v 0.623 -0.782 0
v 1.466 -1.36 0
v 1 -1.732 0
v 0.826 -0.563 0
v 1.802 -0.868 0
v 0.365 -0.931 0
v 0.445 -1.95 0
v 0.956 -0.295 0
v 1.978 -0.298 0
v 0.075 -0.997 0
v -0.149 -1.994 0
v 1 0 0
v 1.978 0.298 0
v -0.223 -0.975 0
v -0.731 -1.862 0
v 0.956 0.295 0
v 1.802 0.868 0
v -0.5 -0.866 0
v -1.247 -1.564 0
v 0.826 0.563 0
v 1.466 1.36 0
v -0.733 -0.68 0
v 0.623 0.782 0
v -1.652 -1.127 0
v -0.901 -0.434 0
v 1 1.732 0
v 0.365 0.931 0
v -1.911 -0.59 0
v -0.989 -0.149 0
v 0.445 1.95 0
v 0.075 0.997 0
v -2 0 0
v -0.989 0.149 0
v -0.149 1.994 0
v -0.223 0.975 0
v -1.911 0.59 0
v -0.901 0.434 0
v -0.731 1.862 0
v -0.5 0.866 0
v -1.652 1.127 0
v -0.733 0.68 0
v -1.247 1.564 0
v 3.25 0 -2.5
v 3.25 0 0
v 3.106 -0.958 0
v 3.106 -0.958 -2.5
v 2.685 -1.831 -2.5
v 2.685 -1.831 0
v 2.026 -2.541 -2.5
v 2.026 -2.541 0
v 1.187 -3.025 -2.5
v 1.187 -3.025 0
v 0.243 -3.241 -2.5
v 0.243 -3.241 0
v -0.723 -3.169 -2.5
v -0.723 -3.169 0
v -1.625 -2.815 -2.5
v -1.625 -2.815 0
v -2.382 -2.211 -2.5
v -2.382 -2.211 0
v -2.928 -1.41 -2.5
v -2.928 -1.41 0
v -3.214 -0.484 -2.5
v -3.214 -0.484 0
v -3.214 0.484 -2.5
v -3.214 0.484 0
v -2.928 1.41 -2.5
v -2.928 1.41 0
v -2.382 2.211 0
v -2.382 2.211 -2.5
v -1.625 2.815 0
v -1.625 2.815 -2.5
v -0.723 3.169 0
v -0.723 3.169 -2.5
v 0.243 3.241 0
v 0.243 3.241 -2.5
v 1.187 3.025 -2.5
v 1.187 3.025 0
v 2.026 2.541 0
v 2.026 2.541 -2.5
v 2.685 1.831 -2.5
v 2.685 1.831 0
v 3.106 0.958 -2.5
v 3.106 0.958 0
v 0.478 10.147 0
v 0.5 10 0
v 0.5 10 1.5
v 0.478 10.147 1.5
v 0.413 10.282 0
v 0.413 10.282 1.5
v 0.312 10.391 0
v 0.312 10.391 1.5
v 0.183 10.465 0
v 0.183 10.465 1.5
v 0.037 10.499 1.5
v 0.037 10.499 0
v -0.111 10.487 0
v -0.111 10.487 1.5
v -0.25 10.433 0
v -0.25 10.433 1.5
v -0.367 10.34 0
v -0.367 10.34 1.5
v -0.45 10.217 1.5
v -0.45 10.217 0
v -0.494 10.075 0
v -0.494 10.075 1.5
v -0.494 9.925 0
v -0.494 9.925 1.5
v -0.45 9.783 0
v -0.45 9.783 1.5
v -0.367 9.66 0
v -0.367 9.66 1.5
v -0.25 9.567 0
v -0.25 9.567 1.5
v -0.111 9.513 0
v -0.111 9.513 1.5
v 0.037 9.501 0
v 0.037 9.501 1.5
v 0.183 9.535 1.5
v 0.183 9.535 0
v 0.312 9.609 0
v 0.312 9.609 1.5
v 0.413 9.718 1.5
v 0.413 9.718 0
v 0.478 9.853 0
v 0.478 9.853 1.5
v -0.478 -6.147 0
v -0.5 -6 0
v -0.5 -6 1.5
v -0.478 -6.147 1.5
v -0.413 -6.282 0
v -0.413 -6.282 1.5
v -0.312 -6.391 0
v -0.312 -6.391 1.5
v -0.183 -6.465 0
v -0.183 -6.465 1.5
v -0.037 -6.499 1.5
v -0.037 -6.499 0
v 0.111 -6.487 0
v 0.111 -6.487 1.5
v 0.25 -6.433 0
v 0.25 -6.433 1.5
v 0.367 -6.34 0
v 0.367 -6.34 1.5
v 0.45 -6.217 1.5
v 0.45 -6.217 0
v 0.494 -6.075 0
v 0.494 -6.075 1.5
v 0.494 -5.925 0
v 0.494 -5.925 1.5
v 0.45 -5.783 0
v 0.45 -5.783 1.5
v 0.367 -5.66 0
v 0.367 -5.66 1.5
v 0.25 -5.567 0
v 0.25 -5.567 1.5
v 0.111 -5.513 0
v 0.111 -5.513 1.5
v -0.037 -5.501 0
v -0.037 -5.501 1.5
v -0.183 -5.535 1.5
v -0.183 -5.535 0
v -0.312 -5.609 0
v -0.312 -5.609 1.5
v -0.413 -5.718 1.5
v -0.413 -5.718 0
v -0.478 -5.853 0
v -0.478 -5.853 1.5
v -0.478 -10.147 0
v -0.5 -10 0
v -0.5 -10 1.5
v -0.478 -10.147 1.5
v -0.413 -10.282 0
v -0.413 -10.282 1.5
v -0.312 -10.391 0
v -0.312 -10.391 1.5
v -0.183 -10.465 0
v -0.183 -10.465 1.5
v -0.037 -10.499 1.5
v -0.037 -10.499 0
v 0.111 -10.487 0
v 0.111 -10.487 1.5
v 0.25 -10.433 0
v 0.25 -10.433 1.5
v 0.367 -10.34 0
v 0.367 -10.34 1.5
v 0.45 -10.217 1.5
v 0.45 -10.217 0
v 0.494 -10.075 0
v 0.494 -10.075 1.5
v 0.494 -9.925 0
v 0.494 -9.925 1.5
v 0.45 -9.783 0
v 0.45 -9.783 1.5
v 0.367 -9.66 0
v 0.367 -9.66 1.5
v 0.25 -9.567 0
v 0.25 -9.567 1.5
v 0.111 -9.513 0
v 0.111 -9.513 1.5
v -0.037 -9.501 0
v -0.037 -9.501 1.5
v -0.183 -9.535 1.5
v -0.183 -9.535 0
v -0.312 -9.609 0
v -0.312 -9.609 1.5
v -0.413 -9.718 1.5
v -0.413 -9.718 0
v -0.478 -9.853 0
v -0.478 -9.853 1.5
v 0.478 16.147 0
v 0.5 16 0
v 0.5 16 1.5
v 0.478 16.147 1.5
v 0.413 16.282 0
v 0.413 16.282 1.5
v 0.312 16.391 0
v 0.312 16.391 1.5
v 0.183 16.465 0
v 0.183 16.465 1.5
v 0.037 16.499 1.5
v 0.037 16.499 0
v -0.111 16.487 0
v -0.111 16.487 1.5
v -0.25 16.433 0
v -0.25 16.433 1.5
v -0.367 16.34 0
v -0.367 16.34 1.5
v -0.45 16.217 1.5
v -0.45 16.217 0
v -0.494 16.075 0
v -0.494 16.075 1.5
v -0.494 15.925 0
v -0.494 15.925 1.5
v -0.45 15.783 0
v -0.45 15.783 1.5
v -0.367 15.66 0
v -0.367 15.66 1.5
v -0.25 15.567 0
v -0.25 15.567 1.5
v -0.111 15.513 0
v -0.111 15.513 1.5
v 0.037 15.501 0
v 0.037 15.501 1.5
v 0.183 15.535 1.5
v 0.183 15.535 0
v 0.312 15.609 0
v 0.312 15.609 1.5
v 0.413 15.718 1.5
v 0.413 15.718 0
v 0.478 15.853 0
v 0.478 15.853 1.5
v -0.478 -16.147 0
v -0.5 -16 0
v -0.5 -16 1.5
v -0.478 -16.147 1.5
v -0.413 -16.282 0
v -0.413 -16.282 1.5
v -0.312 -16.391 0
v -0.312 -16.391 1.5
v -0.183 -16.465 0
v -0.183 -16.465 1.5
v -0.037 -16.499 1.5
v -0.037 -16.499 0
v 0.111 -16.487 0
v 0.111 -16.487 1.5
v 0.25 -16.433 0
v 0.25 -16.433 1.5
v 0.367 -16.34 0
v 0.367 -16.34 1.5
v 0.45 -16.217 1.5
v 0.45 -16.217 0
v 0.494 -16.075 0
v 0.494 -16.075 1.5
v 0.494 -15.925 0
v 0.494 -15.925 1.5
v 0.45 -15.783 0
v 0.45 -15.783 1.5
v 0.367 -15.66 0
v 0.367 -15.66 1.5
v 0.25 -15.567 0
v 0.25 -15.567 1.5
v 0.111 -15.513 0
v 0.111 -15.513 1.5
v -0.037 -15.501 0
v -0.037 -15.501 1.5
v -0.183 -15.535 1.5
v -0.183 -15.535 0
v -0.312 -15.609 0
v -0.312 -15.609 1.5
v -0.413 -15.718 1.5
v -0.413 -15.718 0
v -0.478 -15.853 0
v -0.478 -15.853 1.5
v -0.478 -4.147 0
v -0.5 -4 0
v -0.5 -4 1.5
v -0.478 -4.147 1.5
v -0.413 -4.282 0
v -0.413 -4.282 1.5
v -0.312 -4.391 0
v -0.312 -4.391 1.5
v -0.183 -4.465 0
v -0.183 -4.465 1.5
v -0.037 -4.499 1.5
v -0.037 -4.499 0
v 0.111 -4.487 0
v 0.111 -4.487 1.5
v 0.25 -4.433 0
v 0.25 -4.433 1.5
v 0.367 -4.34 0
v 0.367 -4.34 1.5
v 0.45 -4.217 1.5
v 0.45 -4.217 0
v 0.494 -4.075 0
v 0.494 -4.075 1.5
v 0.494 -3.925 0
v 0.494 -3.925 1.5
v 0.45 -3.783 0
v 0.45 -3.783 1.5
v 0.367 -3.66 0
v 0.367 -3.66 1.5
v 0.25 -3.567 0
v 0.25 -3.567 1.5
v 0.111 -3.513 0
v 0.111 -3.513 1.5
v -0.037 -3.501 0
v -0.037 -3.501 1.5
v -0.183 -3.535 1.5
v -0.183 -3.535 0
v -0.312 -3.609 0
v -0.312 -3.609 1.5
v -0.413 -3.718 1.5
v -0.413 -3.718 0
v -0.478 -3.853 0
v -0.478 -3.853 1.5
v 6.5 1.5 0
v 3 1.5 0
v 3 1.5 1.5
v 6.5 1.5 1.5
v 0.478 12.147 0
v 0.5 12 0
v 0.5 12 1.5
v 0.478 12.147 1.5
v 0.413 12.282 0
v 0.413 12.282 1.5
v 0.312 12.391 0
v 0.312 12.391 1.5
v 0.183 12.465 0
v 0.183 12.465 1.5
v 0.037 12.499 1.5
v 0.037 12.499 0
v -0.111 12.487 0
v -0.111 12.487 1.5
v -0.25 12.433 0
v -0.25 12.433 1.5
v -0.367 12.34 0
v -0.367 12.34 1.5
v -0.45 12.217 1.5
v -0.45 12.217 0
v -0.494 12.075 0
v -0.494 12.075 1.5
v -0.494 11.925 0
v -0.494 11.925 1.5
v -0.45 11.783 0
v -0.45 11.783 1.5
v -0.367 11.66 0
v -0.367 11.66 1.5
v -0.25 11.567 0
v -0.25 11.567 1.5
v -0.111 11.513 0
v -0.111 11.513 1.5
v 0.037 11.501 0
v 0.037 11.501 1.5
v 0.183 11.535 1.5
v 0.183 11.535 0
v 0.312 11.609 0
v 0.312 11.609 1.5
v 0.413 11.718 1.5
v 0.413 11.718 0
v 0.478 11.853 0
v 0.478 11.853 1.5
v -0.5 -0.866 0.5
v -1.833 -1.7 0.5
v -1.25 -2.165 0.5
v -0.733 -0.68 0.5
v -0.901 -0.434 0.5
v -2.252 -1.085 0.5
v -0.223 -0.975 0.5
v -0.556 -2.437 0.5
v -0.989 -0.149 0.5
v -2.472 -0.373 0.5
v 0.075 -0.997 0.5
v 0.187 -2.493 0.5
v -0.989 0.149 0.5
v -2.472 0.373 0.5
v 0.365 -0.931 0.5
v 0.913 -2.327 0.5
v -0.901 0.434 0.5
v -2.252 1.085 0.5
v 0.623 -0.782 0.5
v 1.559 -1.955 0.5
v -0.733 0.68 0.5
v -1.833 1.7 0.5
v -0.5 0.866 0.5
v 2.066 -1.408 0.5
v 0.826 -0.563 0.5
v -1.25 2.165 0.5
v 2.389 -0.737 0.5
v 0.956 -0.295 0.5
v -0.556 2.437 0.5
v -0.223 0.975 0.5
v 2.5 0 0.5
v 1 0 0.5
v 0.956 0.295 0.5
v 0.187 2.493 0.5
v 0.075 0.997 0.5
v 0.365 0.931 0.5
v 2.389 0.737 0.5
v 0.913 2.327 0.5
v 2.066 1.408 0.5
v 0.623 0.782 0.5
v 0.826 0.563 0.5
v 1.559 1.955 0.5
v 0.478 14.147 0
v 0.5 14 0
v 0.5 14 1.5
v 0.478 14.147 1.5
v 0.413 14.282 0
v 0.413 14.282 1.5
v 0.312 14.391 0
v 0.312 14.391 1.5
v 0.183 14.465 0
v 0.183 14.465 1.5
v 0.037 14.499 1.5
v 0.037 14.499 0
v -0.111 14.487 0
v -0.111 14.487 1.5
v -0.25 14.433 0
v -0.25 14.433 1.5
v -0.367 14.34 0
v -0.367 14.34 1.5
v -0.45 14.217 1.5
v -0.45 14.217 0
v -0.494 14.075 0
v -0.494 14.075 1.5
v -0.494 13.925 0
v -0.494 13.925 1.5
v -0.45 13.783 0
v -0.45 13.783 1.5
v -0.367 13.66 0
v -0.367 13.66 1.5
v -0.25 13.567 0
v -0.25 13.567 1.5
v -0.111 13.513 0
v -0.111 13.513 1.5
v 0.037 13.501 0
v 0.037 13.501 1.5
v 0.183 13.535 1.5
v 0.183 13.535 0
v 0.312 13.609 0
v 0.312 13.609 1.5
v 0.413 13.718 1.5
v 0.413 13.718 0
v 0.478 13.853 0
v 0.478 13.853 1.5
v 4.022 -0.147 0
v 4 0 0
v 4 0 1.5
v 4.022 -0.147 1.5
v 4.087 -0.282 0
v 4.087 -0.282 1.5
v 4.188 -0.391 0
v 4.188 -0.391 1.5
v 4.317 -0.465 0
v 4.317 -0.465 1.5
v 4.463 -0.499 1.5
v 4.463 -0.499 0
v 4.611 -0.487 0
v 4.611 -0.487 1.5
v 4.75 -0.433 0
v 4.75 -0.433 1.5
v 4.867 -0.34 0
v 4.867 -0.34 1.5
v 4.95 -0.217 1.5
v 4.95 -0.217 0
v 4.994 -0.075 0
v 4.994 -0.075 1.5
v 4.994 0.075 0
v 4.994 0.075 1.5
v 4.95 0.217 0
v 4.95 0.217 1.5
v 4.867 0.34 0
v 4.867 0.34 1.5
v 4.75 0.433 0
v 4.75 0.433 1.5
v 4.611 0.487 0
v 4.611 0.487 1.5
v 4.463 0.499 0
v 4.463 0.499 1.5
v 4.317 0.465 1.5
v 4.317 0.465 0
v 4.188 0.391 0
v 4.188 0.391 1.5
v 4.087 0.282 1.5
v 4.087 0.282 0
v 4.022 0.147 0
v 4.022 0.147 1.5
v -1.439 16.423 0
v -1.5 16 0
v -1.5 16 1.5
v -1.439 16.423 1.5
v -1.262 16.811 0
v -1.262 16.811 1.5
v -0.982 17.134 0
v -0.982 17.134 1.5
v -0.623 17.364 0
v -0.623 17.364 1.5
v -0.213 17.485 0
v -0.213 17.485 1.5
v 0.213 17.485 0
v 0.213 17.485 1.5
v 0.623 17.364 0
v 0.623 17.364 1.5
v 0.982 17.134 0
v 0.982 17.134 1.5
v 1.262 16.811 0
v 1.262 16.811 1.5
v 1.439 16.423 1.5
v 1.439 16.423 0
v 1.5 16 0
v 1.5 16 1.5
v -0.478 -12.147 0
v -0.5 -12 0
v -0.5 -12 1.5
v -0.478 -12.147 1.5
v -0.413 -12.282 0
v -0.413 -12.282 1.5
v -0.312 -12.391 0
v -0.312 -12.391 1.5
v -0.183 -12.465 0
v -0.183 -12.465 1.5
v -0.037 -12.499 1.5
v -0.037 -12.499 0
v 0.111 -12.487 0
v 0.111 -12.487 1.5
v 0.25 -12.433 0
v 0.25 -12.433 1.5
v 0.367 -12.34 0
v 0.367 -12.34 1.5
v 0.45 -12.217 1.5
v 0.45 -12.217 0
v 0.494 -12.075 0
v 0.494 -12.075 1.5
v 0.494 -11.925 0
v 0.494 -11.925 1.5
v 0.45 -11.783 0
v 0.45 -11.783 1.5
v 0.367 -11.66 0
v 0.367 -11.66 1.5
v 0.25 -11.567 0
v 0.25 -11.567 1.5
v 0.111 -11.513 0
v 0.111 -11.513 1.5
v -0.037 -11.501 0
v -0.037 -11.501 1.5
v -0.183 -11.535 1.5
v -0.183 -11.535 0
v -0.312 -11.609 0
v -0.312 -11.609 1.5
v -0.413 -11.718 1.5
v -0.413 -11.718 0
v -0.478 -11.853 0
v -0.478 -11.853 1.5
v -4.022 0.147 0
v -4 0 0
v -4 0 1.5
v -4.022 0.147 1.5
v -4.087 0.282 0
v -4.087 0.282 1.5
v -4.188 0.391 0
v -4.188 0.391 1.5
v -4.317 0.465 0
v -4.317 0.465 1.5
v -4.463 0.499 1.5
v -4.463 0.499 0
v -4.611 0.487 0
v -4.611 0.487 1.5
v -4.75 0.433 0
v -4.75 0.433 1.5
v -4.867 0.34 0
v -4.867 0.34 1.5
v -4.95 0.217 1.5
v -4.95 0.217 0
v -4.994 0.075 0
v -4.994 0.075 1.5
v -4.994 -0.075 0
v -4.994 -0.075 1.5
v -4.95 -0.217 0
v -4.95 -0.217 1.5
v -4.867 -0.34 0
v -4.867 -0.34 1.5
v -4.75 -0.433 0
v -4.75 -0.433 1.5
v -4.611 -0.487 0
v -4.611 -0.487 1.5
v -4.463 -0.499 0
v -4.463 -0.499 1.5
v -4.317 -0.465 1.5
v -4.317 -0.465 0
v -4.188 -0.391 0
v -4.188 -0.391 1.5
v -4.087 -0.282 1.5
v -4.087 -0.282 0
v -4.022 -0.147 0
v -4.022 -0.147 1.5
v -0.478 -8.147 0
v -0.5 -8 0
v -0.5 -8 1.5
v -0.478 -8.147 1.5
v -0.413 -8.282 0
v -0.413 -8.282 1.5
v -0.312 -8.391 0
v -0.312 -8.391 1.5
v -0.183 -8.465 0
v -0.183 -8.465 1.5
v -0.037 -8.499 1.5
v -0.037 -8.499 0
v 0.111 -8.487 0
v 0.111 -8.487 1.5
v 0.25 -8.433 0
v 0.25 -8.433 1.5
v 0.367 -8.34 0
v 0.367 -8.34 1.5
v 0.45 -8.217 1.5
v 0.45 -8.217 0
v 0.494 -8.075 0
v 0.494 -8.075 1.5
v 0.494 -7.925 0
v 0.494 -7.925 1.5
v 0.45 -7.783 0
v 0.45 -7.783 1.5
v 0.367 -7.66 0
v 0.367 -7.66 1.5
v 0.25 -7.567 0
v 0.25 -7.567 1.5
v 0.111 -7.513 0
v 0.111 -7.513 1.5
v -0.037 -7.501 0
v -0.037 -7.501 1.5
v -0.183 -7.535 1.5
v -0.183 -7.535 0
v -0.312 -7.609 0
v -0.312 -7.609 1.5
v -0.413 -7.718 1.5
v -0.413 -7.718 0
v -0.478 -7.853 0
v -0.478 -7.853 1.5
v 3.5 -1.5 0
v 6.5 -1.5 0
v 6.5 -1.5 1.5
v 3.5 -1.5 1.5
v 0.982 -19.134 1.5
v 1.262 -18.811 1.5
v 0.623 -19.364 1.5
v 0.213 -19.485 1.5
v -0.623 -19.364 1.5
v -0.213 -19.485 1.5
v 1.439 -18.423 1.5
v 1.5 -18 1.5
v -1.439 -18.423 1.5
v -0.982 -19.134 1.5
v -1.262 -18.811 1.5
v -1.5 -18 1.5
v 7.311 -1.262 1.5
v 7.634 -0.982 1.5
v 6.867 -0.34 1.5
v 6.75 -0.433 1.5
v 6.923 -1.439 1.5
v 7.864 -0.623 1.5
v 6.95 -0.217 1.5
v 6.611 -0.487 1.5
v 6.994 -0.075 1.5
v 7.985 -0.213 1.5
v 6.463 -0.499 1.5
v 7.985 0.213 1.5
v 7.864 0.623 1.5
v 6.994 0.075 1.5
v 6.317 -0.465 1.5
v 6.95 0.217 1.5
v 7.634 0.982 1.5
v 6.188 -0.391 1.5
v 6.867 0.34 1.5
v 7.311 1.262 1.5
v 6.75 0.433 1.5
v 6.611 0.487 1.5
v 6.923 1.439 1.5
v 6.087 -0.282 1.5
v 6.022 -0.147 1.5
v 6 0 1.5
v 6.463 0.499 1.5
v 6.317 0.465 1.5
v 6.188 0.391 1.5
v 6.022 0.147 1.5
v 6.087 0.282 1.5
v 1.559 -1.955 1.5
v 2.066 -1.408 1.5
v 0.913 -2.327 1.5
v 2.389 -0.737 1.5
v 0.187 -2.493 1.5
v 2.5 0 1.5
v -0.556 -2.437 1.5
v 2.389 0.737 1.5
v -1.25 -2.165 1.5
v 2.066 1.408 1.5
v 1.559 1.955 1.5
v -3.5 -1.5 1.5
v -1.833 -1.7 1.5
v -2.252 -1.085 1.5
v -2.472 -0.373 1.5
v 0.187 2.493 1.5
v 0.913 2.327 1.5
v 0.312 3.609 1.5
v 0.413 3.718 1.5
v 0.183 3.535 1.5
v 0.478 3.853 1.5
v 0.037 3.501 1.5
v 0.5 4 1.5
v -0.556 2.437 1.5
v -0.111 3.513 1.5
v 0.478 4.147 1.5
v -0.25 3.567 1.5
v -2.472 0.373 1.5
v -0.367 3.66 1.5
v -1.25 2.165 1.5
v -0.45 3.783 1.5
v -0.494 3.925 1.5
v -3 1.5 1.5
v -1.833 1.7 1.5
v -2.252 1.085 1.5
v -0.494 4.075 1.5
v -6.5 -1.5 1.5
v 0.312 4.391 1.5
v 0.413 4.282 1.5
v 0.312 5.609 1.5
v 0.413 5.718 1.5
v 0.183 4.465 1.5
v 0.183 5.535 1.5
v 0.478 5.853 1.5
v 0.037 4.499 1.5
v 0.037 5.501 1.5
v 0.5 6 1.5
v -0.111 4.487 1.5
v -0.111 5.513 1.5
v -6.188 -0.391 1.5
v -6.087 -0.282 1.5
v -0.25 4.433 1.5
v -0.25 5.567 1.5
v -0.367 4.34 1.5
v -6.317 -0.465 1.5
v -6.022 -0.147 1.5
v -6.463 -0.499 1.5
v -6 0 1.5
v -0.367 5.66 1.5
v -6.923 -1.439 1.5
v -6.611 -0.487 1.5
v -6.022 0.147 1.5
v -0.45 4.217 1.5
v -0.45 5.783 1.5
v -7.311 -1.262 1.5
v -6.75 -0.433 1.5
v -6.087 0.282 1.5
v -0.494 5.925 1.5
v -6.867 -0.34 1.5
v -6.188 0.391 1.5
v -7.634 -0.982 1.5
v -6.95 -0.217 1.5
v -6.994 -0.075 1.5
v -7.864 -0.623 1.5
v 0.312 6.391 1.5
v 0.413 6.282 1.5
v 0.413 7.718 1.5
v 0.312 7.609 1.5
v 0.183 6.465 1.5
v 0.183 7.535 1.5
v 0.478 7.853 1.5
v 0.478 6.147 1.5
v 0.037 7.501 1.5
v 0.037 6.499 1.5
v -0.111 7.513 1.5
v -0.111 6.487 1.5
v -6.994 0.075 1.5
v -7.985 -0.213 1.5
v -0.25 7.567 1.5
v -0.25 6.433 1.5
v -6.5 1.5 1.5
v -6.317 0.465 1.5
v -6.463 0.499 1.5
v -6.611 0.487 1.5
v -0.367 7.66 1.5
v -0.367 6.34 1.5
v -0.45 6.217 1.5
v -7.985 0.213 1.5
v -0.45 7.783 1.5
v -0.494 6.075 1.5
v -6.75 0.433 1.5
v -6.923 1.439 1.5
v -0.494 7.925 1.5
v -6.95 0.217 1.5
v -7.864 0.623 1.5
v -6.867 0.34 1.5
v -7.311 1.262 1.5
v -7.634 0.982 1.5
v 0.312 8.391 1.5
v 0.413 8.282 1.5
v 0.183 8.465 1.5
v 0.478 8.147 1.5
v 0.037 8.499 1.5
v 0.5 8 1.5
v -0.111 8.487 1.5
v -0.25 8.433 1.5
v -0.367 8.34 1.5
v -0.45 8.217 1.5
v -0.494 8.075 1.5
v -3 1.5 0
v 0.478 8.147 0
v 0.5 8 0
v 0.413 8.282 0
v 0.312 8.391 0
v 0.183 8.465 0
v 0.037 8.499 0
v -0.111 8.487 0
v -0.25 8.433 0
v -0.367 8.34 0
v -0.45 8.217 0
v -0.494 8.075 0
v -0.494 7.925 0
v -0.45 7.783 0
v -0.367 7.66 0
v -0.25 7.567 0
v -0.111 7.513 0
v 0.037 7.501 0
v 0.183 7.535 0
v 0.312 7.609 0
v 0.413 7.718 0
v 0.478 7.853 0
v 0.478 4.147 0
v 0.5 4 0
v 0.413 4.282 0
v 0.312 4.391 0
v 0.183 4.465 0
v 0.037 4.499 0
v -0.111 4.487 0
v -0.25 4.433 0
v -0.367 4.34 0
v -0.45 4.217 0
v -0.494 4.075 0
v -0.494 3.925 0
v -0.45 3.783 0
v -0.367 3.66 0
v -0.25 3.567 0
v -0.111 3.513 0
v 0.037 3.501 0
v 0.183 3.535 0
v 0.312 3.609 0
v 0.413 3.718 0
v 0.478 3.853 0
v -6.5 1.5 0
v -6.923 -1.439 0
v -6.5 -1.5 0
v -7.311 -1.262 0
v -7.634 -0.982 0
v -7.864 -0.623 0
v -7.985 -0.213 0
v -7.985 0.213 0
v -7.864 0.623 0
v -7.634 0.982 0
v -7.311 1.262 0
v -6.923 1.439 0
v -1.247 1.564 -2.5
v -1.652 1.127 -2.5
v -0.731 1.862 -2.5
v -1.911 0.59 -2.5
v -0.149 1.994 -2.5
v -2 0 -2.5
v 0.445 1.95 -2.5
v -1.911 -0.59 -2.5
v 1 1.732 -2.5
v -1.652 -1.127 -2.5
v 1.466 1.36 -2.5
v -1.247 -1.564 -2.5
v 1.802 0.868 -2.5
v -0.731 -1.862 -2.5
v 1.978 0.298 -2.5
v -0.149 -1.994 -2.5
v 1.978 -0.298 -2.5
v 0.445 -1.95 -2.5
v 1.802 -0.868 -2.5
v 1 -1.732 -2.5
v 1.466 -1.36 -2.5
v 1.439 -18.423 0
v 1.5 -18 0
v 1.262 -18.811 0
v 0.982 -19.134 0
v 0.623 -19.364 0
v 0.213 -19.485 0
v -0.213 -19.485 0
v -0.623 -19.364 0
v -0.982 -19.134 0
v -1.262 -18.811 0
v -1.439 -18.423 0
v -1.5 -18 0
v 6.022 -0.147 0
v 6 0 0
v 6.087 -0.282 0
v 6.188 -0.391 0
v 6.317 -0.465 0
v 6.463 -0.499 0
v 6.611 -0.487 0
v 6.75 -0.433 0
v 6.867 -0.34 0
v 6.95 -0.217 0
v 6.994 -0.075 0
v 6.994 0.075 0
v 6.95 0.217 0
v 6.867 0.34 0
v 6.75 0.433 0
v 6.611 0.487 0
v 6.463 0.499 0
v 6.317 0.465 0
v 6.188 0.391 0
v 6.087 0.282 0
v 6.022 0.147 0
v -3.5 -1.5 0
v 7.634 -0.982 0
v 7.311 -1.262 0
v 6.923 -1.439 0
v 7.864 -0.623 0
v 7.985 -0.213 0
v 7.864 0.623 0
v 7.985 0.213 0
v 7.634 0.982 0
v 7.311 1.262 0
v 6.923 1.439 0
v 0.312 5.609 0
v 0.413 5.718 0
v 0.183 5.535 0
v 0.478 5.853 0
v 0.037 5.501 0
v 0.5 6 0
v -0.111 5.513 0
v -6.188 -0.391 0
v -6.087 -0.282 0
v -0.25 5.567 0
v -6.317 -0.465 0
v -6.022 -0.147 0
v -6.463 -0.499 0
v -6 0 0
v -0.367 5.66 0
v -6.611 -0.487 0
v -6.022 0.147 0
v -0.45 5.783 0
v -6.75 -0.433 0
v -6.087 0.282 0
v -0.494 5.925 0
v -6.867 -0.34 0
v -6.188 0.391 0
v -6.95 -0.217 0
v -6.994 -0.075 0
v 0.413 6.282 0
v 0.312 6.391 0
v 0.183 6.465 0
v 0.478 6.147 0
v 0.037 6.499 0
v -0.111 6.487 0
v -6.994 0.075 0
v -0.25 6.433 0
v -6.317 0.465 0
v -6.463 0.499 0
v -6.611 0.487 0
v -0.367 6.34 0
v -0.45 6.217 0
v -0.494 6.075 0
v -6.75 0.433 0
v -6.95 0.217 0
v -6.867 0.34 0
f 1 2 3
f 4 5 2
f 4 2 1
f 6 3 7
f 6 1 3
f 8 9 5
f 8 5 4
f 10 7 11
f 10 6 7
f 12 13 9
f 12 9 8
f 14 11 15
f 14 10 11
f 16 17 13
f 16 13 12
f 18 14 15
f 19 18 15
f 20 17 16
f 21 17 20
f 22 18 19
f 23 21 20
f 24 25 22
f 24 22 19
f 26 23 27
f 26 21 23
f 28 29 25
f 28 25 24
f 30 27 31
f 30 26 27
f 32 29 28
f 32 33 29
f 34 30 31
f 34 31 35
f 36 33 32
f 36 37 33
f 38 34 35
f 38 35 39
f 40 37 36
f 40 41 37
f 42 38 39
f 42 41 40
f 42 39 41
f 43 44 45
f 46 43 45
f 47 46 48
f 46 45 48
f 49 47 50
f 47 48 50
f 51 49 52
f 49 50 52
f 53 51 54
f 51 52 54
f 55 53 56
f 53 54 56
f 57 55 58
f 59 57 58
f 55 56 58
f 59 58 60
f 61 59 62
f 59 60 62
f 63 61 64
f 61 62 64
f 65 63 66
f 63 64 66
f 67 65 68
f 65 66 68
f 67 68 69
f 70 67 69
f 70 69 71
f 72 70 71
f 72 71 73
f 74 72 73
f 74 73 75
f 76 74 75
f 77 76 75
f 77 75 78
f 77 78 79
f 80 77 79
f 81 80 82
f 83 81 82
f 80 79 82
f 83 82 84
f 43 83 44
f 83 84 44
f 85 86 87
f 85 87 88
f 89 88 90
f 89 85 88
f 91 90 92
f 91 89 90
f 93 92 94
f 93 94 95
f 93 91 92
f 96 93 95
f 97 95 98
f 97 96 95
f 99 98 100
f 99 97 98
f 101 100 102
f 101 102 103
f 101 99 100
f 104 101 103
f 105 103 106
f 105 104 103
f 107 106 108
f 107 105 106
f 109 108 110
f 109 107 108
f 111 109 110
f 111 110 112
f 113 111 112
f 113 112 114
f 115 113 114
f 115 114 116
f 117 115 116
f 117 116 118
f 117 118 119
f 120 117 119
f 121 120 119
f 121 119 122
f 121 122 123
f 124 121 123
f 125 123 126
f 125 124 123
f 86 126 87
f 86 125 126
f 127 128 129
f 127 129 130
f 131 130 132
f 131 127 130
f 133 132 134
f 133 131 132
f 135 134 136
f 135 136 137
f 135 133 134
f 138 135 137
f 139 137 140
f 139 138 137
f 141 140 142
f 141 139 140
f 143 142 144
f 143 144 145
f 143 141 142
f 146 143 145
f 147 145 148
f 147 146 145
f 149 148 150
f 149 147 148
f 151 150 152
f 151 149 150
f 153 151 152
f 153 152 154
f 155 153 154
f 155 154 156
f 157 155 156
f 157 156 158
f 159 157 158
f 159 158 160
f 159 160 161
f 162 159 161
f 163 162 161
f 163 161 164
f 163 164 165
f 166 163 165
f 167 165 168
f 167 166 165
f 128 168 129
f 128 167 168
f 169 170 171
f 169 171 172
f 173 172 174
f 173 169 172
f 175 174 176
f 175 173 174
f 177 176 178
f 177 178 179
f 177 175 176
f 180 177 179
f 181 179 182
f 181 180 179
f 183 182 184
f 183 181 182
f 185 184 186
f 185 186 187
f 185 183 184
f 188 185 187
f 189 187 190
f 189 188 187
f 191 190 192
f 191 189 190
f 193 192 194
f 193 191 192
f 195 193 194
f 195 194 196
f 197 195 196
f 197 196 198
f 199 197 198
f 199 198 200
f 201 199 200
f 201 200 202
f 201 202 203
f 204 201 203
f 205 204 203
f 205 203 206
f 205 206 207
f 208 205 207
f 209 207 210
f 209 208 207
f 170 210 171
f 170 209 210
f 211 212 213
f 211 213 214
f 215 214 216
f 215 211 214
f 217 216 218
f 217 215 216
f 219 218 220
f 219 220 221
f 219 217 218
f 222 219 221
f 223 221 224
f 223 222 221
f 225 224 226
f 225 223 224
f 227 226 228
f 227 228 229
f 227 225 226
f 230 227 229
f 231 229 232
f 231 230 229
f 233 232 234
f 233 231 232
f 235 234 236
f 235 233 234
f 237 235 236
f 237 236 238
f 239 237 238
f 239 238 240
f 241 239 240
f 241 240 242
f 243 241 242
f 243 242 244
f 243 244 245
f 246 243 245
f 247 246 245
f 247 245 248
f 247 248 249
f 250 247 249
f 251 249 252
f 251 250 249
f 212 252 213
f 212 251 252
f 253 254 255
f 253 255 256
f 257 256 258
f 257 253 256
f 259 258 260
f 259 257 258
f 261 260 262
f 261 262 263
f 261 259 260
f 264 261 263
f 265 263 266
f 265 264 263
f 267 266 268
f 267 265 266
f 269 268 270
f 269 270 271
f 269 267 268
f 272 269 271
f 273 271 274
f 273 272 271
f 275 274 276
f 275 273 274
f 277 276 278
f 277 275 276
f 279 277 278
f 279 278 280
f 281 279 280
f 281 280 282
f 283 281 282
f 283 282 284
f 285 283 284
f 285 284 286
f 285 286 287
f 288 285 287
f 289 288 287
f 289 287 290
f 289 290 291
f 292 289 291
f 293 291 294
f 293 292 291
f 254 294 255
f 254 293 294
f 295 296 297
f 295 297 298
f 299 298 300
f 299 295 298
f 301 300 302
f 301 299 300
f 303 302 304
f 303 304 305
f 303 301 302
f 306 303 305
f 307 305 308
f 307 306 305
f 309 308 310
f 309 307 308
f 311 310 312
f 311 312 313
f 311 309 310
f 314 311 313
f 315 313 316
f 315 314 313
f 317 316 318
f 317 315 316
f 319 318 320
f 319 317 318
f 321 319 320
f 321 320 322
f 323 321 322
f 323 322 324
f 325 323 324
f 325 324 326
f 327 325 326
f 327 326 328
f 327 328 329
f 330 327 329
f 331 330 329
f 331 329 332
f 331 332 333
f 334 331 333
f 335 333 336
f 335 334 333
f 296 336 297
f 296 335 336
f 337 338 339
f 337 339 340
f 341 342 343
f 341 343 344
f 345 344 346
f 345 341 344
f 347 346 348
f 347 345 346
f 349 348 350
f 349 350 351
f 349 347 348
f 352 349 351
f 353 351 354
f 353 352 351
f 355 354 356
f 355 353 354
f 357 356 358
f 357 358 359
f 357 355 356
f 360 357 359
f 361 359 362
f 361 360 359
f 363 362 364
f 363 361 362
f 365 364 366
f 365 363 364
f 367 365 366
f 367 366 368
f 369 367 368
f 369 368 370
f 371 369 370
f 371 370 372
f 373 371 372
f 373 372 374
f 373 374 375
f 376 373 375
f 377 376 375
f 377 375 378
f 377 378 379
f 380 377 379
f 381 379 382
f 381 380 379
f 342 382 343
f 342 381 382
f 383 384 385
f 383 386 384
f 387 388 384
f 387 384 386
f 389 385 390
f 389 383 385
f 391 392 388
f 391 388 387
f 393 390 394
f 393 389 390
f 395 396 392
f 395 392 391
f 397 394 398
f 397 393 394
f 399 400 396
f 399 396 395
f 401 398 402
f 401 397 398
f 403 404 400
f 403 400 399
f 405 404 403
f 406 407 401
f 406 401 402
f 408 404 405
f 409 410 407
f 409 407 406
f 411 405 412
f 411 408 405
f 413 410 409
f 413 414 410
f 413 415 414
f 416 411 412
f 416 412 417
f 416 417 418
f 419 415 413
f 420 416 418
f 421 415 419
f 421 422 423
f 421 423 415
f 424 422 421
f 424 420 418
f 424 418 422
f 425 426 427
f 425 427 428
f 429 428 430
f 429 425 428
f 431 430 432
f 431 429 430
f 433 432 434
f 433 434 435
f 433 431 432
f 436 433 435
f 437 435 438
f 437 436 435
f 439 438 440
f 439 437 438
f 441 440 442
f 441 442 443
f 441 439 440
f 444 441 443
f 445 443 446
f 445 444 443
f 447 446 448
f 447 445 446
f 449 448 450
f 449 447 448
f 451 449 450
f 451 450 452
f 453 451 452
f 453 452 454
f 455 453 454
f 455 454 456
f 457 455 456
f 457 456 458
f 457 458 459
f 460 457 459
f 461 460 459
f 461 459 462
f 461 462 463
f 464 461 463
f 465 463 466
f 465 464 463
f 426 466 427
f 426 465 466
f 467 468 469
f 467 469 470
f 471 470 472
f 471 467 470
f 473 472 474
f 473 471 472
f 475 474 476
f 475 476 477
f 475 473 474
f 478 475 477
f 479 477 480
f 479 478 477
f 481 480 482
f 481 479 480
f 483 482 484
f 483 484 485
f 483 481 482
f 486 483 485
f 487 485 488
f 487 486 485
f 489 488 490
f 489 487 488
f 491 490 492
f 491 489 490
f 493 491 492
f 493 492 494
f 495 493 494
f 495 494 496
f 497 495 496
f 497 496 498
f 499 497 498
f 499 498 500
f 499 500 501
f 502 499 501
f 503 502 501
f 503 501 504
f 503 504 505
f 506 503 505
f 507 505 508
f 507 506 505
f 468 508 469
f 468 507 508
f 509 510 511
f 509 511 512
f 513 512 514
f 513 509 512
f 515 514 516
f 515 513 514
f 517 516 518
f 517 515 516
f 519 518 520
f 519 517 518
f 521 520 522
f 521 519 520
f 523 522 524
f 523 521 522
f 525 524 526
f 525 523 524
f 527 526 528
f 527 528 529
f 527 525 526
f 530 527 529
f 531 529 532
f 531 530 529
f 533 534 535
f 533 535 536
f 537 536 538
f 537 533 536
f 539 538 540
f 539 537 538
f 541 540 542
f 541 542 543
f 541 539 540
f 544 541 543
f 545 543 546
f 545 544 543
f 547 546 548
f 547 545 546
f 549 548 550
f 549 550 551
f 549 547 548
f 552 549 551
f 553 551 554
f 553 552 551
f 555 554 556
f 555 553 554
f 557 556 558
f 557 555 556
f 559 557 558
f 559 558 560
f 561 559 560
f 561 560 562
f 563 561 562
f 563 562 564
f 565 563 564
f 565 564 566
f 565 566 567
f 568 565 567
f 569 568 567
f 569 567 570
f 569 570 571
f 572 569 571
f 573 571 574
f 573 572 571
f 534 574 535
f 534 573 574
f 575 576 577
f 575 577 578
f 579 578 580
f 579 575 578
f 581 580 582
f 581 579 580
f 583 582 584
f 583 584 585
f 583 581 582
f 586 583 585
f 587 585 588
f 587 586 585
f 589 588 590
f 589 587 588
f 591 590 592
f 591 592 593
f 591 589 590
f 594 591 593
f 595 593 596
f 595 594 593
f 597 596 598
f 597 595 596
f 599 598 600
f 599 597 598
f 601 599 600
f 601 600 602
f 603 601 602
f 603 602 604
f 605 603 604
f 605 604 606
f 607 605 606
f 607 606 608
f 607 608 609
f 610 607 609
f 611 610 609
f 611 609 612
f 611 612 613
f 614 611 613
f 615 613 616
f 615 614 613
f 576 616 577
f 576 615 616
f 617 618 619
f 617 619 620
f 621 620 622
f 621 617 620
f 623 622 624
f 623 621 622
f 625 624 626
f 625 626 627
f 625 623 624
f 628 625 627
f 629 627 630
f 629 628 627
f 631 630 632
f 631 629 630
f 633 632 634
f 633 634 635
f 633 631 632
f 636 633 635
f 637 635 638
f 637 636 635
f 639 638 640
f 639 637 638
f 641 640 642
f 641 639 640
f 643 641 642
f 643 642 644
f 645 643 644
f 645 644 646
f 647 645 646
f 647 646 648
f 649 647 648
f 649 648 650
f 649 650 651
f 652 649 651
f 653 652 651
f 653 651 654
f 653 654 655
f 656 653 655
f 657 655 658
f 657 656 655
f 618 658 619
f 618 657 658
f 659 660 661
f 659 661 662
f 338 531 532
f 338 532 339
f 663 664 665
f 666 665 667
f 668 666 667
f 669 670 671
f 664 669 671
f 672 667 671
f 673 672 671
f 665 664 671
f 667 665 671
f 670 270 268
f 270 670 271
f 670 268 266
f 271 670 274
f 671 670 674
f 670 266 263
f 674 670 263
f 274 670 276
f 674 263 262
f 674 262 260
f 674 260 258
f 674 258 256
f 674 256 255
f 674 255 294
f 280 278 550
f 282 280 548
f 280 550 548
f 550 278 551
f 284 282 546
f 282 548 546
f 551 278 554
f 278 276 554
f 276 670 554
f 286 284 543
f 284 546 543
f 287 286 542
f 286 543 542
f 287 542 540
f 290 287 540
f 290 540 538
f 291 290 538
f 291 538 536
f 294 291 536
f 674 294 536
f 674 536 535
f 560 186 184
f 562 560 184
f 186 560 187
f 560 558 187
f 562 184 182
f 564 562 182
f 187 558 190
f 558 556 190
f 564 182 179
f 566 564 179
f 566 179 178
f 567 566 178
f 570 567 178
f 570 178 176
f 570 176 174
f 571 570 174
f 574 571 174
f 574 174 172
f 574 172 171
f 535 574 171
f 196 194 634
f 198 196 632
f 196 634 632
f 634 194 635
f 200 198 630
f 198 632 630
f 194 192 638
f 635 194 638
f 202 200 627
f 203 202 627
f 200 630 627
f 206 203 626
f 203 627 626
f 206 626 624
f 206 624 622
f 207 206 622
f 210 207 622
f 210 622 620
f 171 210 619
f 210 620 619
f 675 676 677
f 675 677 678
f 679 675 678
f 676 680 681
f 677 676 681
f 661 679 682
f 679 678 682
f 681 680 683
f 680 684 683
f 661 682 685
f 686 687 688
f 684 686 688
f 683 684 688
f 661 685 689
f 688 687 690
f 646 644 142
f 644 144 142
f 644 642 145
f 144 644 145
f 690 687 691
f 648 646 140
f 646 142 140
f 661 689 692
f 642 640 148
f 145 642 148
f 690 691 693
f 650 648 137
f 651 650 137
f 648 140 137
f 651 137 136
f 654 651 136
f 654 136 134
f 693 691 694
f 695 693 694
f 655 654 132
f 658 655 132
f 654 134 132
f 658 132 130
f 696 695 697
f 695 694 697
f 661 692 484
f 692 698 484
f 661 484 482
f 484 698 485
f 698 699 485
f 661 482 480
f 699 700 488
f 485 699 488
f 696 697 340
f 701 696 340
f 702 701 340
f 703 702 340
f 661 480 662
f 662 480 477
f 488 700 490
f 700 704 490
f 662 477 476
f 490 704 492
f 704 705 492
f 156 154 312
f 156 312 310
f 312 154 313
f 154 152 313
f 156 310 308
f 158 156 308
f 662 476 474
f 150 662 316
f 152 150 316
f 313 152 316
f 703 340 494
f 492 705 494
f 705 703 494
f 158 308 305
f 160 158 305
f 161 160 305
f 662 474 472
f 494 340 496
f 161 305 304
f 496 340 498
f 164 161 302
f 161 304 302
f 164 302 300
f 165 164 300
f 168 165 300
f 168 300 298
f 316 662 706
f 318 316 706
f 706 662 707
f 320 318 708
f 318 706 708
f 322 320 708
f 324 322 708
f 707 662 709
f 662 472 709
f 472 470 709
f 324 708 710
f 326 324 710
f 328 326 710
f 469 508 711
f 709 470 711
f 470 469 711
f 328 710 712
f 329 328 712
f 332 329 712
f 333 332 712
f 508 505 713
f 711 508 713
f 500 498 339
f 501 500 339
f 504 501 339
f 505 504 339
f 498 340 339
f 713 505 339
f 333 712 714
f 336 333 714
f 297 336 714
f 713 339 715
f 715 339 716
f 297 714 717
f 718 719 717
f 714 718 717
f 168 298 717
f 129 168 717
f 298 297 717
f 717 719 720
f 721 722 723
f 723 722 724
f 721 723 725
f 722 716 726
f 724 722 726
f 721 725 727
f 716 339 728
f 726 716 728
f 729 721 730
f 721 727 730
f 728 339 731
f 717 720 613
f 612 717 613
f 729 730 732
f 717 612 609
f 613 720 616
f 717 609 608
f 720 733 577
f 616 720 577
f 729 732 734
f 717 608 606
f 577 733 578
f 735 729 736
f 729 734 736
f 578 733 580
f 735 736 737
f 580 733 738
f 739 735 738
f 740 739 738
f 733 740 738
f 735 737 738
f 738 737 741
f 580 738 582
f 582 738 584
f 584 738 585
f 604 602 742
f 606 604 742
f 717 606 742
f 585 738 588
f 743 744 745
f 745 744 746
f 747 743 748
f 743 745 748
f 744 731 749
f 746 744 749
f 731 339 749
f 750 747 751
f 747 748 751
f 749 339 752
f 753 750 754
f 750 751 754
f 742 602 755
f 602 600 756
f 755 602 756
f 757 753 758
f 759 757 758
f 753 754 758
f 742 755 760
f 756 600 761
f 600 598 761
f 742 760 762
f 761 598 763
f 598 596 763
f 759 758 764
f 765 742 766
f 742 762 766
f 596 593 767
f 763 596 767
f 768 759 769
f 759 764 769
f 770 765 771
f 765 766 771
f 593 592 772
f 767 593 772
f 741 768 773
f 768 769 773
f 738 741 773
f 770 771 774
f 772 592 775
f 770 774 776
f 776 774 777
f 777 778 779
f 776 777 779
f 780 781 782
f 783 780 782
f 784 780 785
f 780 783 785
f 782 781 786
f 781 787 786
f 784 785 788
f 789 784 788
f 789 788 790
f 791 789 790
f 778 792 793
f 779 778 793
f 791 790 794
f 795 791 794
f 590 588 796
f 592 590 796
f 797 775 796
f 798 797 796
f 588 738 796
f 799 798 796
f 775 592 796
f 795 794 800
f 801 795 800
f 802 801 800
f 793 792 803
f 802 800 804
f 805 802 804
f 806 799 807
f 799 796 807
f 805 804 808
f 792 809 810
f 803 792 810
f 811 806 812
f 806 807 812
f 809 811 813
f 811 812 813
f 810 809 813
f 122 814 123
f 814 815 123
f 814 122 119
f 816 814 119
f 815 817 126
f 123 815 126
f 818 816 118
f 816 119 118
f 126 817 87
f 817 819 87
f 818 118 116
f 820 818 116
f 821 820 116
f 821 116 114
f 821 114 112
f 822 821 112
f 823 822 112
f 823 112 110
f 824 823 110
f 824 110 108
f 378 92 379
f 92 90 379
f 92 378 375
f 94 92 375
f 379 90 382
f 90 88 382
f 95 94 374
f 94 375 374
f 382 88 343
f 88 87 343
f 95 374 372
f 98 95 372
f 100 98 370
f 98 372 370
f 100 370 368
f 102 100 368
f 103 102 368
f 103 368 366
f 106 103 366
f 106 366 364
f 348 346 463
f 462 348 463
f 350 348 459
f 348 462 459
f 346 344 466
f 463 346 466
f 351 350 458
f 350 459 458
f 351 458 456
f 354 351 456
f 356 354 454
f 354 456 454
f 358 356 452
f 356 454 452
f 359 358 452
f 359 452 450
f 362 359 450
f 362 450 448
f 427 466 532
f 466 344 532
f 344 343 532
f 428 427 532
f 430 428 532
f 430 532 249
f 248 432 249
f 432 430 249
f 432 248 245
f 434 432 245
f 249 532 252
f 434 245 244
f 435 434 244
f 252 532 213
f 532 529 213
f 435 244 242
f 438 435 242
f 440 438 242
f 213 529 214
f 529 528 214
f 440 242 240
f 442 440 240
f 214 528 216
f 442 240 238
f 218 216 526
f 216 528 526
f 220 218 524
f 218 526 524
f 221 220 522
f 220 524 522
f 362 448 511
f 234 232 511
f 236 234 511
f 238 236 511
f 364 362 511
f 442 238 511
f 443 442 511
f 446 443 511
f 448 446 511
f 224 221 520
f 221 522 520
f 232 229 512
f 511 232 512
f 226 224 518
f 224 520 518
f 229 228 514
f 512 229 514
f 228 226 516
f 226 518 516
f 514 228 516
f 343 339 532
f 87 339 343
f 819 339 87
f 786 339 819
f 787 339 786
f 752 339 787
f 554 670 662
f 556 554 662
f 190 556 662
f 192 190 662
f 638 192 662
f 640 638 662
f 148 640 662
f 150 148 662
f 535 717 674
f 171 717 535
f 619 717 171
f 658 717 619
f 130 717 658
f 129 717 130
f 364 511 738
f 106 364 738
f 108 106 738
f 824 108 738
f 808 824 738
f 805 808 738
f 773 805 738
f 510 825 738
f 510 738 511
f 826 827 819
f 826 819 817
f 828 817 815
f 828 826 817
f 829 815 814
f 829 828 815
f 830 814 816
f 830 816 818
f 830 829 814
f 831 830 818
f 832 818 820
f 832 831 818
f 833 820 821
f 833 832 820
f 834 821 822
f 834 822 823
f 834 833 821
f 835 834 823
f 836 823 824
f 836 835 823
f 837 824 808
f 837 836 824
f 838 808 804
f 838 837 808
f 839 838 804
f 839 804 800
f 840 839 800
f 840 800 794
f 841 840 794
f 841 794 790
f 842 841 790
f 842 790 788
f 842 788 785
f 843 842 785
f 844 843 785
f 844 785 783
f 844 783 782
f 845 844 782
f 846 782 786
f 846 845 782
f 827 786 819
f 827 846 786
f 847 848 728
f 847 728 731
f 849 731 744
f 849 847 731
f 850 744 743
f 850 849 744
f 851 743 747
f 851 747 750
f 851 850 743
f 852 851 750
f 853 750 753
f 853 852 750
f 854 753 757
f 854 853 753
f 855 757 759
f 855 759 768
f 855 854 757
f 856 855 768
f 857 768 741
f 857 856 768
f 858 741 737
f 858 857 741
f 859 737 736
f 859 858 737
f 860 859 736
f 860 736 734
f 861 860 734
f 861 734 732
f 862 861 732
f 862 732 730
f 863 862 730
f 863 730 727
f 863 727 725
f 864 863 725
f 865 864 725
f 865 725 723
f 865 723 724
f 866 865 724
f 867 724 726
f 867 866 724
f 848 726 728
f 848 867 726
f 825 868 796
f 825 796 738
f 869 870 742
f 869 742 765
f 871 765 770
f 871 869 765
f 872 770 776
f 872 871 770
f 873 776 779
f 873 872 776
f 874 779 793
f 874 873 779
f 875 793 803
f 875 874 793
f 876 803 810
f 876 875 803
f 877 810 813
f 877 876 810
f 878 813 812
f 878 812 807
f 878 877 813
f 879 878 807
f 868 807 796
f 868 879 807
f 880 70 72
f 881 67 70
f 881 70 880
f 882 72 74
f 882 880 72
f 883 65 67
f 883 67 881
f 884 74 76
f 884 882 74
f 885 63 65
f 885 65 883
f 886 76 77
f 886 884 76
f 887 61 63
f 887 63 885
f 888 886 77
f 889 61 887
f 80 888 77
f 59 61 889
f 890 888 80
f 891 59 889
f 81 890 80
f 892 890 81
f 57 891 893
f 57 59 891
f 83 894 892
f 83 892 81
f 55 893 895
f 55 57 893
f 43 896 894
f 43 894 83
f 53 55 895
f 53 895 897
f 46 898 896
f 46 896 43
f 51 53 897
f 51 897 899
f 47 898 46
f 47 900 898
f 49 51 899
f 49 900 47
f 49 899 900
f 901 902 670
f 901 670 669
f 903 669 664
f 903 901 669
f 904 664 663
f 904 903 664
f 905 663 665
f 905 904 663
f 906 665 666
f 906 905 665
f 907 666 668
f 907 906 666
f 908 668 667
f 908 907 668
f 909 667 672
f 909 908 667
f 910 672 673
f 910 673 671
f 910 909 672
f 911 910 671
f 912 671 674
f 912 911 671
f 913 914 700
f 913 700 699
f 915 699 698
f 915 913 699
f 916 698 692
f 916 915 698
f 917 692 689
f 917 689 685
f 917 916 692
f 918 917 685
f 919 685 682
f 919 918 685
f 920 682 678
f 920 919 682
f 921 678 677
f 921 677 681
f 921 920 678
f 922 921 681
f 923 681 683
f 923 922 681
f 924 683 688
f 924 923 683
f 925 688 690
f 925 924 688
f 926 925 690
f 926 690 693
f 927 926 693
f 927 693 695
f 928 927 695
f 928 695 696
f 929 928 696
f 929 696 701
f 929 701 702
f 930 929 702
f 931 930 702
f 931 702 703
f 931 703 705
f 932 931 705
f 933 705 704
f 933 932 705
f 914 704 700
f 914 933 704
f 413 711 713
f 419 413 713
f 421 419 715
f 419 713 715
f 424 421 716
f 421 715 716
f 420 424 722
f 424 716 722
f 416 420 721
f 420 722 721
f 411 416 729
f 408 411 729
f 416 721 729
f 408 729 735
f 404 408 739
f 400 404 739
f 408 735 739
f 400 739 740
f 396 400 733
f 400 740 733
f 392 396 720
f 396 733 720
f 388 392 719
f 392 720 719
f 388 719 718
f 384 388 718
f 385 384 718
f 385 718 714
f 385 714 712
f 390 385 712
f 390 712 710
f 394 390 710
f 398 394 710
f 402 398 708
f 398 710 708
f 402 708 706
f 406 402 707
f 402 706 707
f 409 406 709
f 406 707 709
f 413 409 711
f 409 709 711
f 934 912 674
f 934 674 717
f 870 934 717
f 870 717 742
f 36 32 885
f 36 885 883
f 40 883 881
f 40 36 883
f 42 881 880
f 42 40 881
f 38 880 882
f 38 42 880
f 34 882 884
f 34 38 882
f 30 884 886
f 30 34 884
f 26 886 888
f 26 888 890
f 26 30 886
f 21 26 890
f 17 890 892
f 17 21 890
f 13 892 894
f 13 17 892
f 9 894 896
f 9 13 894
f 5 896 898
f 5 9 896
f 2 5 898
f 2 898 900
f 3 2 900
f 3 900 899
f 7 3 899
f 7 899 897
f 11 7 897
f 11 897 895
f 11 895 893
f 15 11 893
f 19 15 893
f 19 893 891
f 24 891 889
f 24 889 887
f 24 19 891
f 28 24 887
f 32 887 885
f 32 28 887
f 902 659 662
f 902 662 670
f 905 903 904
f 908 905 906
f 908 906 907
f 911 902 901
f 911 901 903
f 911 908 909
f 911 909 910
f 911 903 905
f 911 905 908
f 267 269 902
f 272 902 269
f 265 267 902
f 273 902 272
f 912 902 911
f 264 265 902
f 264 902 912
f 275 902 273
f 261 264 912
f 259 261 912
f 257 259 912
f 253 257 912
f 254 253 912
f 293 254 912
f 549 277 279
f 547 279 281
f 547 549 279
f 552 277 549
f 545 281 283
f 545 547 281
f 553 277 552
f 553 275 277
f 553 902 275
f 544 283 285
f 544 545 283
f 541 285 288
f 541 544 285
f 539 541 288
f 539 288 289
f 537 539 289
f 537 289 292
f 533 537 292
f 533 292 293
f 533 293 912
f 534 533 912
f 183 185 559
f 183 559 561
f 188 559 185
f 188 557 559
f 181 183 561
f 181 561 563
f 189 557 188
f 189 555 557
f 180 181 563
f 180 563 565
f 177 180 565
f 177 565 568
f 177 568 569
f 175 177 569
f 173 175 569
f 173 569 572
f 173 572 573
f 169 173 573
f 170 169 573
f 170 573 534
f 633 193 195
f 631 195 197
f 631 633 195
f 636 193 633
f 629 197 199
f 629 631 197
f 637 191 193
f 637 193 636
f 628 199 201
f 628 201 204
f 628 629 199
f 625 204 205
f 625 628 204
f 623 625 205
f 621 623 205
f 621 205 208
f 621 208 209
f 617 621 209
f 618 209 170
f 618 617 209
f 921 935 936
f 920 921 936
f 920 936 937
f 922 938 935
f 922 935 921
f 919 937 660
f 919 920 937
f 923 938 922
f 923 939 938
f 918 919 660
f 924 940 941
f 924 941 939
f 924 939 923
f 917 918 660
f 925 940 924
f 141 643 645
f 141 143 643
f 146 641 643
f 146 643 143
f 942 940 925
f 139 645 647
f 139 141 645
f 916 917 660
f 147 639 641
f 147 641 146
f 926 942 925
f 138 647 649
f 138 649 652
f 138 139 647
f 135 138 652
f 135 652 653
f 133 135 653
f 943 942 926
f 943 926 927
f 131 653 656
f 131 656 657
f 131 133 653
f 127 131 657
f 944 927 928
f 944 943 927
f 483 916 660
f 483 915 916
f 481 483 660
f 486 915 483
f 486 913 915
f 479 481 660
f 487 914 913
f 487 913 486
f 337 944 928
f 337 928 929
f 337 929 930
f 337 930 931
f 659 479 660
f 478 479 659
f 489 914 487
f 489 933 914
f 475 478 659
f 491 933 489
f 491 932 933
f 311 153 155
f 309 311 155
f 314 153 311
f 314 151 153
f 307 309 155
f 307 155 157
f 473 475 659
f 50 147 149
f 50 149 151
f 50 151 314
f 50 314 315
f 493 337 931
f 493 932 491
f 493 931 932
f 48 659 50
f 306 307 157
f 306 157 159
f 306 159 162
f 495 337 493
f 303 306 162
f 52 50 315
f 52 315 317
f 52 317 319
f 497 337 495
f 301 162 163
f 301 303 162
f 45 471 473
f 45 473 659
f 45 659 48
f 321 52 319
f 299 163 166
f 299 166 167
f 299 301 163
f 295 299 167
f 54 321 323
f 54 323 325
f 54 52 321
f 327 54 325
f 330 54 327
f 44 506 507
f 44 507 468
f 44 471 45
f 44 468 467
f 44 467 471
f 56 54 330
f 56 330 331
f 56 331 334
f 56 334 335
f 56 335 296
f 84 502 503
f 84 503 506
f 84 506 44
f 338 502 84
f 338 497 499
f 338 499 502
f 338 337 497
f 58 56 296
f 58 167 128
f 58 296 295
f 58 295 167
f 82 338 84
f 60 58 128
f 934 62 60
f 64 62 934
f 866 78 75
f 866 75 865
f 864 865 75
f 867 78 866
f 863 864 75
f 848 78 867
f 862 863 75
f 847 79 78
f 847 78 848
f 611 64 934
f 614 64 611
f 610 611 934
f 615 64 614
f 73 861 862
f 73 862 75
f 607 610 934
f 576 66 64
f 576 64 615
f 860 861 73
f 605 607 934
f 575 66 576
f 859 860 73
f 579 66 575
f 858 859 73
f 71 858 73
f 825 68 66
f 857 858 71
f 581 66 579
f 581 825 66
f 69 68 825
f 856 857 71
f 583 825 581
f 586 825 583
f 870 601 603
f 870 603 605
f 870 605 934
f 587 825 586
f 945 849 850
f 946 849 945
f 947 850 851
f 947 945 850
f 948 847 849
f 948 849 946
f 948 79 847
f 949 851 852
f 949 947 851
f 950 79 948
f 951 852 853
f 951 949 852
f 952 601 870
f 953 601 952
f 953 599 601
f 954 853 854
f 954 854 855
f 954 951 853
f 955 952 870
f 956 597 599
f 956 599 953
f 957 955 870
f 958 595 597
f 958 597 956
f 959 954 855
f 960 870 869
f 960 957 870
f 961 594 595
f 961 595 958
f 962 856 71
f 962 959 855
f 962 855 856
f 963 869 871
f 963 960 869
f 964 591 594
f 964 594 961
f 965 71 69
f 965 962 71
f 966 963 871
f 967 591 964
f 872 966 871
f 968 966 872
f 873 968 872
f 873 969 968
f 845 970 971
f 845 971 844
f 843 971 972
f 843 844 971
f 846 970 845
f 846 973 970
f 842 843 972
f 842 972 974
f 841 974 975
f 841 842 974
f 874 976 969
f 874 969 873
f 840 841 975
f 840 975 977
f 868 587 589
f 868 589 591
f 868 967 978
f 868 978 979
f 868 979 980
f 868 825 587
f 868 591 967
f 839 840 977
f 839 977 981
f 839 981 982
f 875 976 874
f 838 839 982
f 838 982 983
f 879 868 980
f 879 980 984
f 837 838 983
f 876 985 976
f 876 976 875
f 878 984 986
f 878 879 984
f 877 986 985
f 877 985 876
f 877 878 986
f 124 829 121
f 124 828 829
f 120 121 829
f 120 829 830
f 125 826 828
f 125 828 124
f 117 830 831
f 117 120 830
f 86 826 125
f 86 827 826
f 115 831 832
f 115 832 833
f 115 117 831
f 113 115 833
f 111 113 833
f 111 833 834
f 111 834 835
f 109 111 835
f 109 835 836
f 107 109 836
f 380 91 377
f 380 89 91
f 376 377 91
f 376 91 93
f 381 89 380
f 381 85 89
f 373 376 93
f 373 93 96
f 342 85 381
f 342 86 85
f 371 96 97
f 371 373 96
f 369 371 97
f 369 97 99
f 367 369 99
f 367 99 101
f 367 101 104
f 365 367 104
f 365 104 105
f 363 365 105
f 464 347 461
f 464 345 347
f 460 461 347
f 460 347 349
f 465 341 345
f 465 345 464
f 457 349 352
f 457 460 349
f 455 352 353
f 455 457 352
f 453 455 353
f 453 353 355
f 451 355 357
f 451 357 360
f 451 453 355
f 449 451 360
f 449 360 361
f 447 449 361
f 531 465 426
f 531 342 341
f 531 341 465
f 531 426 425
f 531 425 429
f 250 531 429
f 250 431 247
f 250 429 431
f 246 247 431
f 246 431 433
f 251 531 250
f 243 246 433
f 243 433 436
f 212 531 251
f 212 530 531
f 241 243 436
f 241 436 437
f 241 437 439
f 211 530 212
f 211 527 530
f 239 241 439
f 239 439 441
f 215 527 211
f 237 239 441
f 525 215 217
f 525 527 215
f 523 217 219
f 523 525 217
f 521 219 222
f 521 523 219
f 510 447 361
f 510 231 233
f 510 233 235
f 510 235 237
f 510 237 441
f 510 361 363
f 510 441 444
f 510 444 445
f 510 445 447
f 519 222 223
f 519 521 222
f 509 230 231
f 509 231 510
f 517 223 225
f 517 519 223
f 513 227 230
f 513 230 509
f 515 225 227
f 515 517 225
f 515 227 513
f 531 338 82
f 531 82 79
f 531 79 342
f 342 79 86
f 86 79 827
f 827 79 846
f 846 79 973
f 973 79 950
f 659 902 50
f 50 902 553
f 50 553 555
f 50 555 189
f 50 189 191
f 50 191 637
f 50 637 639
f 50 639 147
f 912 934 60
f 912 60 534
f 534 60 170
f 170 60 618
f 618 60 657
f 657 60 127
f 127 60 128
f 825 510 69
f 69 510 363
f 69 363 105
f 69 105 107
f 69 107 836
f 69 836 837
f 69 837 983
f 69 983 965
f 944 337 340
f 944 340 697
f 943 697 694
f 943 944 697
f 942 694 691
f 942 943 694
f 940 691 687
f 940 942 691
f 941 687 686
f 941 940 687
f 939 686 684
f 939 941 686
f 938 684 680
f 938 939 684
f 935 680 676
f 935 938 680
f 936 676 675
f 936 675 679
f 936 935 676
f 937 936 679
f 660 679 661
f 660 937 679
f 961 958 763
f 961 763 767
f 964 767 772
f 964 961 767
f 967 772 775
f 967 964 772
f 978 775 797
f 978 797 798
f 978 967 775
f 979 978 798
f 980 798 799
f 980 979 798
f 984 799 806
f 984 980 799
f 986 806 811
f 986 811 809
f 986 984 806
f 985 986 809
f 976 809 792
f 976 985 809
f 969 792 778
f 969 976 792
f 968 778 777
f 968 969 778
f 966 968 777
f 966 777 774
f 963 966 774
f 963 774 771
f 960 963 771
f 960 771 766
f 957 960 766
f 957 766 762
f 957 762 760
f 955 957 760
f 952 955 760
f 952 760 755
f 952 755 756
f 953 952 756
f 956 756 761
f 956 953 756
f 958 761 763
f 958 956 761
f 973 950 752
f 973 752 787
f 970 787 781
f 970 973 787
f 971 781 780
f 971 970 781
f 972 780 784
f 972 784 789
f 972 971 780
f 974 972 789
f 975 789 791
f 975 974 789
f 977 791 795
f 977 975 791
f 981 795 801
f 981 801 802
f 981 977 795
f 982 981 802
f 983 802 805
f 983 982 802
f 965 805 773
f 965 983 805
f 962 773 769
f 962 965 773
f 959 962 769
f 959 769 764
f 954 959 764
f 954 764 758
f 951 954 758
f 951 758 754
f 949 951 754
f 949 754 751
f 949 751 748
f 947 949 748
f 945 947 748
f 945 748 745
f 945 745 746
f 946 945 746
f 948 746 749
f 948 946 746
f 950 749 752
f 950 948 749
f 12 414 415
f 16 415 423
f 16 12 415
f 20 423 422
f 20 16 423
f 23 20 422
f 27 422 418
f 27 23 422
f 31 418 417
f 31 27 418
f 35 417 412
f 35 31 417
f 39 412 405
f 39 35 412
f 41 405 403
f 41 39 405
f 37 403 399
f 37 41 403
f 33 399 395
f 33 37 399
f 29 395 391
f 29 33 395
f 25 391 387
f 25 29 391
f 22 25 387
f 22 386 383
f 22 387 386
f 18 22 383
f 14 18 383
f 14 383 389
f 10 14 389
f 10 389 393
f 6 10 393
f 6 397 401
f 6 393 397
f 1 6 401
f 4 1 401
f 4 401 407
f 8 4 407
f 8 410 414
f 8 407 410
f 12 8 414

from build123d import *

# Parameters (mm, degrees)
SKETCH_1_R          = 0.5
SKETCH_1_R_2        = 1
EXTRUDE_1_DEPTH     = 1.5
SKETCH_2_R          = 3.25
SKETCH_2_R_2        = 2
EXTRUDE_2_DEPTH     = 2.5
SKETCH_3_R          = 2.5
CUT_EXTRUDE_1_DEPTH = 1


with BuildPart() as part:
    # 草图1 → 凸台-拉伸1 (new body)
    with BuildSketch(Plane.XY):
        with BuildLine():
            Line((1.5, 16), (3, 1.5))
            Line((3, 1.5), (6.5, 1.5))
            ThreePointArc((6.5, 1.5), (8, 0), (6.5, -1.5))
            Line((6.5, -1.5), (3.5, -1.5))
            Line((3.5, -1.5), (1.5, -18))
            ThreePointArc((1.5, -18), (0, -19.5), (-1.5, -18))
            Line((-1.5, -18), (-3.5, -1.5))
            Line((-3.5, -1.5), (-6.5, -1.5))
            ThreePointArc((-6.5, -1.5), (-8, 0), (-6.5, 1.5))
            Line((-6.5, 1.5), (-3, 1.5))
            Line((-3, 1.5), (-1.5, 16))
            ThreePointArc((-1.5, 16), (0, 17.5), (1.5, 16))
        make_face()
        with Locations((-6.5, 0)):
            Circle(SKETCH_1_R, mode=Mode.SUBTRACT)
        Circle(SKETCH_1_R_2, mode=Mode.SUBTRACT)
        with Locations((-4.5, 0)):
            Circle(SKETCH_1_R, mode=Mode.SUBTRACT)
        with Locations(Location((4.5, 0, 0), (0, 0, 180))):
            Circle(SKETCH_1_R, mode=Mode.SUBTRACT)
        with Locations(Location((6.5, 0, 0), (0, 0, 180))):
            Circle(SKETCH_1_R, mode=Mode.SUBTRACT)
        with Locations((0, 16)):
            Circle(SKETCH_1_R, mode=Mode.SUBTRACT)
        with Locations((0, 14)):
            Circle(SKETCH_1_R, mode=Mode.SUBTRACT)
        with Locations((0, 12)):
            Circle(SKETCH_1_R, mode=Mode.SUBTRACT)
        with Locations((0, 10)):
            Circle(SKETCH_1_R, mode=Mode.SUBTRACT)
        with Locations((0, 8)):
            Circle(SKETCH_1_R, mode=Mode.SUBTRACT)
        with Locations((0, 6)):
            Circle(SKETCH_1_R, mode=Mode.SUBTRACT)
        with Locations((0, 4)):
            Circle(SKETCH_1_R, mode=Mode.SUBTRACT)
        with Locations(Location((0, -16, 0), (0, 0, 180))):
            Circle(SKETCH_1_R, mode=Mode.SUBTRACT)
        with Locations(Location((0, -4, 0), (0, 0, 180))):
            Circle(SKETCH_1_R, mode=Mode.SUBTRACT)
        with Locations(Location((0, -6, 0), (0, 0, 180))):
            Circle(SKETCH_1_R, mode=Mode.SUBTRACT)
        with Locations(Location((0, -8, 0), (0, 0, 180))):
            Circle(SKETCH_1_R, mode=Mode.SUBTRACT)
        with Locations(Location((0, -10, 0), (0, 0, 180))):
            Circle(SKETCH_1_R, mode=Mode.SUBTRACT)
        with Locations(Location((0, -12, 0), (0, 0, 180))):
            Circle(SKETCH_1_R, mode=Mode.SUBTRACT)
    extrude(amount=EXTRUDE_1_DEPTH)

    # 草图2 → 凸台-拉伸2 (add)
    with BuildSketch(Plane(origin=(0, 0, 0), x_dir=(-1, 0, 0), z_dir=(0, 0, -1))):
        with Locations(Location((0, 0, 0), (0, 0, 180))):
            Circle(SKETCH_2_R)
        Circle(SKETCH_2_R_2, mode=Mode.SUBTRACT)
    extrude(amount=EXTRUDE_2_DEPTH)

    # 草图3 → 切除-拉伸1 (cut)
    with BuildSketch(Plane.XY.offset(1.5)):
        Circle(SKETCH_3_R)
    extrude(amount=-CUT_EXTRUDE_1_DEPTH, mode=Mode.SUBTRACT)


solid = part.part
